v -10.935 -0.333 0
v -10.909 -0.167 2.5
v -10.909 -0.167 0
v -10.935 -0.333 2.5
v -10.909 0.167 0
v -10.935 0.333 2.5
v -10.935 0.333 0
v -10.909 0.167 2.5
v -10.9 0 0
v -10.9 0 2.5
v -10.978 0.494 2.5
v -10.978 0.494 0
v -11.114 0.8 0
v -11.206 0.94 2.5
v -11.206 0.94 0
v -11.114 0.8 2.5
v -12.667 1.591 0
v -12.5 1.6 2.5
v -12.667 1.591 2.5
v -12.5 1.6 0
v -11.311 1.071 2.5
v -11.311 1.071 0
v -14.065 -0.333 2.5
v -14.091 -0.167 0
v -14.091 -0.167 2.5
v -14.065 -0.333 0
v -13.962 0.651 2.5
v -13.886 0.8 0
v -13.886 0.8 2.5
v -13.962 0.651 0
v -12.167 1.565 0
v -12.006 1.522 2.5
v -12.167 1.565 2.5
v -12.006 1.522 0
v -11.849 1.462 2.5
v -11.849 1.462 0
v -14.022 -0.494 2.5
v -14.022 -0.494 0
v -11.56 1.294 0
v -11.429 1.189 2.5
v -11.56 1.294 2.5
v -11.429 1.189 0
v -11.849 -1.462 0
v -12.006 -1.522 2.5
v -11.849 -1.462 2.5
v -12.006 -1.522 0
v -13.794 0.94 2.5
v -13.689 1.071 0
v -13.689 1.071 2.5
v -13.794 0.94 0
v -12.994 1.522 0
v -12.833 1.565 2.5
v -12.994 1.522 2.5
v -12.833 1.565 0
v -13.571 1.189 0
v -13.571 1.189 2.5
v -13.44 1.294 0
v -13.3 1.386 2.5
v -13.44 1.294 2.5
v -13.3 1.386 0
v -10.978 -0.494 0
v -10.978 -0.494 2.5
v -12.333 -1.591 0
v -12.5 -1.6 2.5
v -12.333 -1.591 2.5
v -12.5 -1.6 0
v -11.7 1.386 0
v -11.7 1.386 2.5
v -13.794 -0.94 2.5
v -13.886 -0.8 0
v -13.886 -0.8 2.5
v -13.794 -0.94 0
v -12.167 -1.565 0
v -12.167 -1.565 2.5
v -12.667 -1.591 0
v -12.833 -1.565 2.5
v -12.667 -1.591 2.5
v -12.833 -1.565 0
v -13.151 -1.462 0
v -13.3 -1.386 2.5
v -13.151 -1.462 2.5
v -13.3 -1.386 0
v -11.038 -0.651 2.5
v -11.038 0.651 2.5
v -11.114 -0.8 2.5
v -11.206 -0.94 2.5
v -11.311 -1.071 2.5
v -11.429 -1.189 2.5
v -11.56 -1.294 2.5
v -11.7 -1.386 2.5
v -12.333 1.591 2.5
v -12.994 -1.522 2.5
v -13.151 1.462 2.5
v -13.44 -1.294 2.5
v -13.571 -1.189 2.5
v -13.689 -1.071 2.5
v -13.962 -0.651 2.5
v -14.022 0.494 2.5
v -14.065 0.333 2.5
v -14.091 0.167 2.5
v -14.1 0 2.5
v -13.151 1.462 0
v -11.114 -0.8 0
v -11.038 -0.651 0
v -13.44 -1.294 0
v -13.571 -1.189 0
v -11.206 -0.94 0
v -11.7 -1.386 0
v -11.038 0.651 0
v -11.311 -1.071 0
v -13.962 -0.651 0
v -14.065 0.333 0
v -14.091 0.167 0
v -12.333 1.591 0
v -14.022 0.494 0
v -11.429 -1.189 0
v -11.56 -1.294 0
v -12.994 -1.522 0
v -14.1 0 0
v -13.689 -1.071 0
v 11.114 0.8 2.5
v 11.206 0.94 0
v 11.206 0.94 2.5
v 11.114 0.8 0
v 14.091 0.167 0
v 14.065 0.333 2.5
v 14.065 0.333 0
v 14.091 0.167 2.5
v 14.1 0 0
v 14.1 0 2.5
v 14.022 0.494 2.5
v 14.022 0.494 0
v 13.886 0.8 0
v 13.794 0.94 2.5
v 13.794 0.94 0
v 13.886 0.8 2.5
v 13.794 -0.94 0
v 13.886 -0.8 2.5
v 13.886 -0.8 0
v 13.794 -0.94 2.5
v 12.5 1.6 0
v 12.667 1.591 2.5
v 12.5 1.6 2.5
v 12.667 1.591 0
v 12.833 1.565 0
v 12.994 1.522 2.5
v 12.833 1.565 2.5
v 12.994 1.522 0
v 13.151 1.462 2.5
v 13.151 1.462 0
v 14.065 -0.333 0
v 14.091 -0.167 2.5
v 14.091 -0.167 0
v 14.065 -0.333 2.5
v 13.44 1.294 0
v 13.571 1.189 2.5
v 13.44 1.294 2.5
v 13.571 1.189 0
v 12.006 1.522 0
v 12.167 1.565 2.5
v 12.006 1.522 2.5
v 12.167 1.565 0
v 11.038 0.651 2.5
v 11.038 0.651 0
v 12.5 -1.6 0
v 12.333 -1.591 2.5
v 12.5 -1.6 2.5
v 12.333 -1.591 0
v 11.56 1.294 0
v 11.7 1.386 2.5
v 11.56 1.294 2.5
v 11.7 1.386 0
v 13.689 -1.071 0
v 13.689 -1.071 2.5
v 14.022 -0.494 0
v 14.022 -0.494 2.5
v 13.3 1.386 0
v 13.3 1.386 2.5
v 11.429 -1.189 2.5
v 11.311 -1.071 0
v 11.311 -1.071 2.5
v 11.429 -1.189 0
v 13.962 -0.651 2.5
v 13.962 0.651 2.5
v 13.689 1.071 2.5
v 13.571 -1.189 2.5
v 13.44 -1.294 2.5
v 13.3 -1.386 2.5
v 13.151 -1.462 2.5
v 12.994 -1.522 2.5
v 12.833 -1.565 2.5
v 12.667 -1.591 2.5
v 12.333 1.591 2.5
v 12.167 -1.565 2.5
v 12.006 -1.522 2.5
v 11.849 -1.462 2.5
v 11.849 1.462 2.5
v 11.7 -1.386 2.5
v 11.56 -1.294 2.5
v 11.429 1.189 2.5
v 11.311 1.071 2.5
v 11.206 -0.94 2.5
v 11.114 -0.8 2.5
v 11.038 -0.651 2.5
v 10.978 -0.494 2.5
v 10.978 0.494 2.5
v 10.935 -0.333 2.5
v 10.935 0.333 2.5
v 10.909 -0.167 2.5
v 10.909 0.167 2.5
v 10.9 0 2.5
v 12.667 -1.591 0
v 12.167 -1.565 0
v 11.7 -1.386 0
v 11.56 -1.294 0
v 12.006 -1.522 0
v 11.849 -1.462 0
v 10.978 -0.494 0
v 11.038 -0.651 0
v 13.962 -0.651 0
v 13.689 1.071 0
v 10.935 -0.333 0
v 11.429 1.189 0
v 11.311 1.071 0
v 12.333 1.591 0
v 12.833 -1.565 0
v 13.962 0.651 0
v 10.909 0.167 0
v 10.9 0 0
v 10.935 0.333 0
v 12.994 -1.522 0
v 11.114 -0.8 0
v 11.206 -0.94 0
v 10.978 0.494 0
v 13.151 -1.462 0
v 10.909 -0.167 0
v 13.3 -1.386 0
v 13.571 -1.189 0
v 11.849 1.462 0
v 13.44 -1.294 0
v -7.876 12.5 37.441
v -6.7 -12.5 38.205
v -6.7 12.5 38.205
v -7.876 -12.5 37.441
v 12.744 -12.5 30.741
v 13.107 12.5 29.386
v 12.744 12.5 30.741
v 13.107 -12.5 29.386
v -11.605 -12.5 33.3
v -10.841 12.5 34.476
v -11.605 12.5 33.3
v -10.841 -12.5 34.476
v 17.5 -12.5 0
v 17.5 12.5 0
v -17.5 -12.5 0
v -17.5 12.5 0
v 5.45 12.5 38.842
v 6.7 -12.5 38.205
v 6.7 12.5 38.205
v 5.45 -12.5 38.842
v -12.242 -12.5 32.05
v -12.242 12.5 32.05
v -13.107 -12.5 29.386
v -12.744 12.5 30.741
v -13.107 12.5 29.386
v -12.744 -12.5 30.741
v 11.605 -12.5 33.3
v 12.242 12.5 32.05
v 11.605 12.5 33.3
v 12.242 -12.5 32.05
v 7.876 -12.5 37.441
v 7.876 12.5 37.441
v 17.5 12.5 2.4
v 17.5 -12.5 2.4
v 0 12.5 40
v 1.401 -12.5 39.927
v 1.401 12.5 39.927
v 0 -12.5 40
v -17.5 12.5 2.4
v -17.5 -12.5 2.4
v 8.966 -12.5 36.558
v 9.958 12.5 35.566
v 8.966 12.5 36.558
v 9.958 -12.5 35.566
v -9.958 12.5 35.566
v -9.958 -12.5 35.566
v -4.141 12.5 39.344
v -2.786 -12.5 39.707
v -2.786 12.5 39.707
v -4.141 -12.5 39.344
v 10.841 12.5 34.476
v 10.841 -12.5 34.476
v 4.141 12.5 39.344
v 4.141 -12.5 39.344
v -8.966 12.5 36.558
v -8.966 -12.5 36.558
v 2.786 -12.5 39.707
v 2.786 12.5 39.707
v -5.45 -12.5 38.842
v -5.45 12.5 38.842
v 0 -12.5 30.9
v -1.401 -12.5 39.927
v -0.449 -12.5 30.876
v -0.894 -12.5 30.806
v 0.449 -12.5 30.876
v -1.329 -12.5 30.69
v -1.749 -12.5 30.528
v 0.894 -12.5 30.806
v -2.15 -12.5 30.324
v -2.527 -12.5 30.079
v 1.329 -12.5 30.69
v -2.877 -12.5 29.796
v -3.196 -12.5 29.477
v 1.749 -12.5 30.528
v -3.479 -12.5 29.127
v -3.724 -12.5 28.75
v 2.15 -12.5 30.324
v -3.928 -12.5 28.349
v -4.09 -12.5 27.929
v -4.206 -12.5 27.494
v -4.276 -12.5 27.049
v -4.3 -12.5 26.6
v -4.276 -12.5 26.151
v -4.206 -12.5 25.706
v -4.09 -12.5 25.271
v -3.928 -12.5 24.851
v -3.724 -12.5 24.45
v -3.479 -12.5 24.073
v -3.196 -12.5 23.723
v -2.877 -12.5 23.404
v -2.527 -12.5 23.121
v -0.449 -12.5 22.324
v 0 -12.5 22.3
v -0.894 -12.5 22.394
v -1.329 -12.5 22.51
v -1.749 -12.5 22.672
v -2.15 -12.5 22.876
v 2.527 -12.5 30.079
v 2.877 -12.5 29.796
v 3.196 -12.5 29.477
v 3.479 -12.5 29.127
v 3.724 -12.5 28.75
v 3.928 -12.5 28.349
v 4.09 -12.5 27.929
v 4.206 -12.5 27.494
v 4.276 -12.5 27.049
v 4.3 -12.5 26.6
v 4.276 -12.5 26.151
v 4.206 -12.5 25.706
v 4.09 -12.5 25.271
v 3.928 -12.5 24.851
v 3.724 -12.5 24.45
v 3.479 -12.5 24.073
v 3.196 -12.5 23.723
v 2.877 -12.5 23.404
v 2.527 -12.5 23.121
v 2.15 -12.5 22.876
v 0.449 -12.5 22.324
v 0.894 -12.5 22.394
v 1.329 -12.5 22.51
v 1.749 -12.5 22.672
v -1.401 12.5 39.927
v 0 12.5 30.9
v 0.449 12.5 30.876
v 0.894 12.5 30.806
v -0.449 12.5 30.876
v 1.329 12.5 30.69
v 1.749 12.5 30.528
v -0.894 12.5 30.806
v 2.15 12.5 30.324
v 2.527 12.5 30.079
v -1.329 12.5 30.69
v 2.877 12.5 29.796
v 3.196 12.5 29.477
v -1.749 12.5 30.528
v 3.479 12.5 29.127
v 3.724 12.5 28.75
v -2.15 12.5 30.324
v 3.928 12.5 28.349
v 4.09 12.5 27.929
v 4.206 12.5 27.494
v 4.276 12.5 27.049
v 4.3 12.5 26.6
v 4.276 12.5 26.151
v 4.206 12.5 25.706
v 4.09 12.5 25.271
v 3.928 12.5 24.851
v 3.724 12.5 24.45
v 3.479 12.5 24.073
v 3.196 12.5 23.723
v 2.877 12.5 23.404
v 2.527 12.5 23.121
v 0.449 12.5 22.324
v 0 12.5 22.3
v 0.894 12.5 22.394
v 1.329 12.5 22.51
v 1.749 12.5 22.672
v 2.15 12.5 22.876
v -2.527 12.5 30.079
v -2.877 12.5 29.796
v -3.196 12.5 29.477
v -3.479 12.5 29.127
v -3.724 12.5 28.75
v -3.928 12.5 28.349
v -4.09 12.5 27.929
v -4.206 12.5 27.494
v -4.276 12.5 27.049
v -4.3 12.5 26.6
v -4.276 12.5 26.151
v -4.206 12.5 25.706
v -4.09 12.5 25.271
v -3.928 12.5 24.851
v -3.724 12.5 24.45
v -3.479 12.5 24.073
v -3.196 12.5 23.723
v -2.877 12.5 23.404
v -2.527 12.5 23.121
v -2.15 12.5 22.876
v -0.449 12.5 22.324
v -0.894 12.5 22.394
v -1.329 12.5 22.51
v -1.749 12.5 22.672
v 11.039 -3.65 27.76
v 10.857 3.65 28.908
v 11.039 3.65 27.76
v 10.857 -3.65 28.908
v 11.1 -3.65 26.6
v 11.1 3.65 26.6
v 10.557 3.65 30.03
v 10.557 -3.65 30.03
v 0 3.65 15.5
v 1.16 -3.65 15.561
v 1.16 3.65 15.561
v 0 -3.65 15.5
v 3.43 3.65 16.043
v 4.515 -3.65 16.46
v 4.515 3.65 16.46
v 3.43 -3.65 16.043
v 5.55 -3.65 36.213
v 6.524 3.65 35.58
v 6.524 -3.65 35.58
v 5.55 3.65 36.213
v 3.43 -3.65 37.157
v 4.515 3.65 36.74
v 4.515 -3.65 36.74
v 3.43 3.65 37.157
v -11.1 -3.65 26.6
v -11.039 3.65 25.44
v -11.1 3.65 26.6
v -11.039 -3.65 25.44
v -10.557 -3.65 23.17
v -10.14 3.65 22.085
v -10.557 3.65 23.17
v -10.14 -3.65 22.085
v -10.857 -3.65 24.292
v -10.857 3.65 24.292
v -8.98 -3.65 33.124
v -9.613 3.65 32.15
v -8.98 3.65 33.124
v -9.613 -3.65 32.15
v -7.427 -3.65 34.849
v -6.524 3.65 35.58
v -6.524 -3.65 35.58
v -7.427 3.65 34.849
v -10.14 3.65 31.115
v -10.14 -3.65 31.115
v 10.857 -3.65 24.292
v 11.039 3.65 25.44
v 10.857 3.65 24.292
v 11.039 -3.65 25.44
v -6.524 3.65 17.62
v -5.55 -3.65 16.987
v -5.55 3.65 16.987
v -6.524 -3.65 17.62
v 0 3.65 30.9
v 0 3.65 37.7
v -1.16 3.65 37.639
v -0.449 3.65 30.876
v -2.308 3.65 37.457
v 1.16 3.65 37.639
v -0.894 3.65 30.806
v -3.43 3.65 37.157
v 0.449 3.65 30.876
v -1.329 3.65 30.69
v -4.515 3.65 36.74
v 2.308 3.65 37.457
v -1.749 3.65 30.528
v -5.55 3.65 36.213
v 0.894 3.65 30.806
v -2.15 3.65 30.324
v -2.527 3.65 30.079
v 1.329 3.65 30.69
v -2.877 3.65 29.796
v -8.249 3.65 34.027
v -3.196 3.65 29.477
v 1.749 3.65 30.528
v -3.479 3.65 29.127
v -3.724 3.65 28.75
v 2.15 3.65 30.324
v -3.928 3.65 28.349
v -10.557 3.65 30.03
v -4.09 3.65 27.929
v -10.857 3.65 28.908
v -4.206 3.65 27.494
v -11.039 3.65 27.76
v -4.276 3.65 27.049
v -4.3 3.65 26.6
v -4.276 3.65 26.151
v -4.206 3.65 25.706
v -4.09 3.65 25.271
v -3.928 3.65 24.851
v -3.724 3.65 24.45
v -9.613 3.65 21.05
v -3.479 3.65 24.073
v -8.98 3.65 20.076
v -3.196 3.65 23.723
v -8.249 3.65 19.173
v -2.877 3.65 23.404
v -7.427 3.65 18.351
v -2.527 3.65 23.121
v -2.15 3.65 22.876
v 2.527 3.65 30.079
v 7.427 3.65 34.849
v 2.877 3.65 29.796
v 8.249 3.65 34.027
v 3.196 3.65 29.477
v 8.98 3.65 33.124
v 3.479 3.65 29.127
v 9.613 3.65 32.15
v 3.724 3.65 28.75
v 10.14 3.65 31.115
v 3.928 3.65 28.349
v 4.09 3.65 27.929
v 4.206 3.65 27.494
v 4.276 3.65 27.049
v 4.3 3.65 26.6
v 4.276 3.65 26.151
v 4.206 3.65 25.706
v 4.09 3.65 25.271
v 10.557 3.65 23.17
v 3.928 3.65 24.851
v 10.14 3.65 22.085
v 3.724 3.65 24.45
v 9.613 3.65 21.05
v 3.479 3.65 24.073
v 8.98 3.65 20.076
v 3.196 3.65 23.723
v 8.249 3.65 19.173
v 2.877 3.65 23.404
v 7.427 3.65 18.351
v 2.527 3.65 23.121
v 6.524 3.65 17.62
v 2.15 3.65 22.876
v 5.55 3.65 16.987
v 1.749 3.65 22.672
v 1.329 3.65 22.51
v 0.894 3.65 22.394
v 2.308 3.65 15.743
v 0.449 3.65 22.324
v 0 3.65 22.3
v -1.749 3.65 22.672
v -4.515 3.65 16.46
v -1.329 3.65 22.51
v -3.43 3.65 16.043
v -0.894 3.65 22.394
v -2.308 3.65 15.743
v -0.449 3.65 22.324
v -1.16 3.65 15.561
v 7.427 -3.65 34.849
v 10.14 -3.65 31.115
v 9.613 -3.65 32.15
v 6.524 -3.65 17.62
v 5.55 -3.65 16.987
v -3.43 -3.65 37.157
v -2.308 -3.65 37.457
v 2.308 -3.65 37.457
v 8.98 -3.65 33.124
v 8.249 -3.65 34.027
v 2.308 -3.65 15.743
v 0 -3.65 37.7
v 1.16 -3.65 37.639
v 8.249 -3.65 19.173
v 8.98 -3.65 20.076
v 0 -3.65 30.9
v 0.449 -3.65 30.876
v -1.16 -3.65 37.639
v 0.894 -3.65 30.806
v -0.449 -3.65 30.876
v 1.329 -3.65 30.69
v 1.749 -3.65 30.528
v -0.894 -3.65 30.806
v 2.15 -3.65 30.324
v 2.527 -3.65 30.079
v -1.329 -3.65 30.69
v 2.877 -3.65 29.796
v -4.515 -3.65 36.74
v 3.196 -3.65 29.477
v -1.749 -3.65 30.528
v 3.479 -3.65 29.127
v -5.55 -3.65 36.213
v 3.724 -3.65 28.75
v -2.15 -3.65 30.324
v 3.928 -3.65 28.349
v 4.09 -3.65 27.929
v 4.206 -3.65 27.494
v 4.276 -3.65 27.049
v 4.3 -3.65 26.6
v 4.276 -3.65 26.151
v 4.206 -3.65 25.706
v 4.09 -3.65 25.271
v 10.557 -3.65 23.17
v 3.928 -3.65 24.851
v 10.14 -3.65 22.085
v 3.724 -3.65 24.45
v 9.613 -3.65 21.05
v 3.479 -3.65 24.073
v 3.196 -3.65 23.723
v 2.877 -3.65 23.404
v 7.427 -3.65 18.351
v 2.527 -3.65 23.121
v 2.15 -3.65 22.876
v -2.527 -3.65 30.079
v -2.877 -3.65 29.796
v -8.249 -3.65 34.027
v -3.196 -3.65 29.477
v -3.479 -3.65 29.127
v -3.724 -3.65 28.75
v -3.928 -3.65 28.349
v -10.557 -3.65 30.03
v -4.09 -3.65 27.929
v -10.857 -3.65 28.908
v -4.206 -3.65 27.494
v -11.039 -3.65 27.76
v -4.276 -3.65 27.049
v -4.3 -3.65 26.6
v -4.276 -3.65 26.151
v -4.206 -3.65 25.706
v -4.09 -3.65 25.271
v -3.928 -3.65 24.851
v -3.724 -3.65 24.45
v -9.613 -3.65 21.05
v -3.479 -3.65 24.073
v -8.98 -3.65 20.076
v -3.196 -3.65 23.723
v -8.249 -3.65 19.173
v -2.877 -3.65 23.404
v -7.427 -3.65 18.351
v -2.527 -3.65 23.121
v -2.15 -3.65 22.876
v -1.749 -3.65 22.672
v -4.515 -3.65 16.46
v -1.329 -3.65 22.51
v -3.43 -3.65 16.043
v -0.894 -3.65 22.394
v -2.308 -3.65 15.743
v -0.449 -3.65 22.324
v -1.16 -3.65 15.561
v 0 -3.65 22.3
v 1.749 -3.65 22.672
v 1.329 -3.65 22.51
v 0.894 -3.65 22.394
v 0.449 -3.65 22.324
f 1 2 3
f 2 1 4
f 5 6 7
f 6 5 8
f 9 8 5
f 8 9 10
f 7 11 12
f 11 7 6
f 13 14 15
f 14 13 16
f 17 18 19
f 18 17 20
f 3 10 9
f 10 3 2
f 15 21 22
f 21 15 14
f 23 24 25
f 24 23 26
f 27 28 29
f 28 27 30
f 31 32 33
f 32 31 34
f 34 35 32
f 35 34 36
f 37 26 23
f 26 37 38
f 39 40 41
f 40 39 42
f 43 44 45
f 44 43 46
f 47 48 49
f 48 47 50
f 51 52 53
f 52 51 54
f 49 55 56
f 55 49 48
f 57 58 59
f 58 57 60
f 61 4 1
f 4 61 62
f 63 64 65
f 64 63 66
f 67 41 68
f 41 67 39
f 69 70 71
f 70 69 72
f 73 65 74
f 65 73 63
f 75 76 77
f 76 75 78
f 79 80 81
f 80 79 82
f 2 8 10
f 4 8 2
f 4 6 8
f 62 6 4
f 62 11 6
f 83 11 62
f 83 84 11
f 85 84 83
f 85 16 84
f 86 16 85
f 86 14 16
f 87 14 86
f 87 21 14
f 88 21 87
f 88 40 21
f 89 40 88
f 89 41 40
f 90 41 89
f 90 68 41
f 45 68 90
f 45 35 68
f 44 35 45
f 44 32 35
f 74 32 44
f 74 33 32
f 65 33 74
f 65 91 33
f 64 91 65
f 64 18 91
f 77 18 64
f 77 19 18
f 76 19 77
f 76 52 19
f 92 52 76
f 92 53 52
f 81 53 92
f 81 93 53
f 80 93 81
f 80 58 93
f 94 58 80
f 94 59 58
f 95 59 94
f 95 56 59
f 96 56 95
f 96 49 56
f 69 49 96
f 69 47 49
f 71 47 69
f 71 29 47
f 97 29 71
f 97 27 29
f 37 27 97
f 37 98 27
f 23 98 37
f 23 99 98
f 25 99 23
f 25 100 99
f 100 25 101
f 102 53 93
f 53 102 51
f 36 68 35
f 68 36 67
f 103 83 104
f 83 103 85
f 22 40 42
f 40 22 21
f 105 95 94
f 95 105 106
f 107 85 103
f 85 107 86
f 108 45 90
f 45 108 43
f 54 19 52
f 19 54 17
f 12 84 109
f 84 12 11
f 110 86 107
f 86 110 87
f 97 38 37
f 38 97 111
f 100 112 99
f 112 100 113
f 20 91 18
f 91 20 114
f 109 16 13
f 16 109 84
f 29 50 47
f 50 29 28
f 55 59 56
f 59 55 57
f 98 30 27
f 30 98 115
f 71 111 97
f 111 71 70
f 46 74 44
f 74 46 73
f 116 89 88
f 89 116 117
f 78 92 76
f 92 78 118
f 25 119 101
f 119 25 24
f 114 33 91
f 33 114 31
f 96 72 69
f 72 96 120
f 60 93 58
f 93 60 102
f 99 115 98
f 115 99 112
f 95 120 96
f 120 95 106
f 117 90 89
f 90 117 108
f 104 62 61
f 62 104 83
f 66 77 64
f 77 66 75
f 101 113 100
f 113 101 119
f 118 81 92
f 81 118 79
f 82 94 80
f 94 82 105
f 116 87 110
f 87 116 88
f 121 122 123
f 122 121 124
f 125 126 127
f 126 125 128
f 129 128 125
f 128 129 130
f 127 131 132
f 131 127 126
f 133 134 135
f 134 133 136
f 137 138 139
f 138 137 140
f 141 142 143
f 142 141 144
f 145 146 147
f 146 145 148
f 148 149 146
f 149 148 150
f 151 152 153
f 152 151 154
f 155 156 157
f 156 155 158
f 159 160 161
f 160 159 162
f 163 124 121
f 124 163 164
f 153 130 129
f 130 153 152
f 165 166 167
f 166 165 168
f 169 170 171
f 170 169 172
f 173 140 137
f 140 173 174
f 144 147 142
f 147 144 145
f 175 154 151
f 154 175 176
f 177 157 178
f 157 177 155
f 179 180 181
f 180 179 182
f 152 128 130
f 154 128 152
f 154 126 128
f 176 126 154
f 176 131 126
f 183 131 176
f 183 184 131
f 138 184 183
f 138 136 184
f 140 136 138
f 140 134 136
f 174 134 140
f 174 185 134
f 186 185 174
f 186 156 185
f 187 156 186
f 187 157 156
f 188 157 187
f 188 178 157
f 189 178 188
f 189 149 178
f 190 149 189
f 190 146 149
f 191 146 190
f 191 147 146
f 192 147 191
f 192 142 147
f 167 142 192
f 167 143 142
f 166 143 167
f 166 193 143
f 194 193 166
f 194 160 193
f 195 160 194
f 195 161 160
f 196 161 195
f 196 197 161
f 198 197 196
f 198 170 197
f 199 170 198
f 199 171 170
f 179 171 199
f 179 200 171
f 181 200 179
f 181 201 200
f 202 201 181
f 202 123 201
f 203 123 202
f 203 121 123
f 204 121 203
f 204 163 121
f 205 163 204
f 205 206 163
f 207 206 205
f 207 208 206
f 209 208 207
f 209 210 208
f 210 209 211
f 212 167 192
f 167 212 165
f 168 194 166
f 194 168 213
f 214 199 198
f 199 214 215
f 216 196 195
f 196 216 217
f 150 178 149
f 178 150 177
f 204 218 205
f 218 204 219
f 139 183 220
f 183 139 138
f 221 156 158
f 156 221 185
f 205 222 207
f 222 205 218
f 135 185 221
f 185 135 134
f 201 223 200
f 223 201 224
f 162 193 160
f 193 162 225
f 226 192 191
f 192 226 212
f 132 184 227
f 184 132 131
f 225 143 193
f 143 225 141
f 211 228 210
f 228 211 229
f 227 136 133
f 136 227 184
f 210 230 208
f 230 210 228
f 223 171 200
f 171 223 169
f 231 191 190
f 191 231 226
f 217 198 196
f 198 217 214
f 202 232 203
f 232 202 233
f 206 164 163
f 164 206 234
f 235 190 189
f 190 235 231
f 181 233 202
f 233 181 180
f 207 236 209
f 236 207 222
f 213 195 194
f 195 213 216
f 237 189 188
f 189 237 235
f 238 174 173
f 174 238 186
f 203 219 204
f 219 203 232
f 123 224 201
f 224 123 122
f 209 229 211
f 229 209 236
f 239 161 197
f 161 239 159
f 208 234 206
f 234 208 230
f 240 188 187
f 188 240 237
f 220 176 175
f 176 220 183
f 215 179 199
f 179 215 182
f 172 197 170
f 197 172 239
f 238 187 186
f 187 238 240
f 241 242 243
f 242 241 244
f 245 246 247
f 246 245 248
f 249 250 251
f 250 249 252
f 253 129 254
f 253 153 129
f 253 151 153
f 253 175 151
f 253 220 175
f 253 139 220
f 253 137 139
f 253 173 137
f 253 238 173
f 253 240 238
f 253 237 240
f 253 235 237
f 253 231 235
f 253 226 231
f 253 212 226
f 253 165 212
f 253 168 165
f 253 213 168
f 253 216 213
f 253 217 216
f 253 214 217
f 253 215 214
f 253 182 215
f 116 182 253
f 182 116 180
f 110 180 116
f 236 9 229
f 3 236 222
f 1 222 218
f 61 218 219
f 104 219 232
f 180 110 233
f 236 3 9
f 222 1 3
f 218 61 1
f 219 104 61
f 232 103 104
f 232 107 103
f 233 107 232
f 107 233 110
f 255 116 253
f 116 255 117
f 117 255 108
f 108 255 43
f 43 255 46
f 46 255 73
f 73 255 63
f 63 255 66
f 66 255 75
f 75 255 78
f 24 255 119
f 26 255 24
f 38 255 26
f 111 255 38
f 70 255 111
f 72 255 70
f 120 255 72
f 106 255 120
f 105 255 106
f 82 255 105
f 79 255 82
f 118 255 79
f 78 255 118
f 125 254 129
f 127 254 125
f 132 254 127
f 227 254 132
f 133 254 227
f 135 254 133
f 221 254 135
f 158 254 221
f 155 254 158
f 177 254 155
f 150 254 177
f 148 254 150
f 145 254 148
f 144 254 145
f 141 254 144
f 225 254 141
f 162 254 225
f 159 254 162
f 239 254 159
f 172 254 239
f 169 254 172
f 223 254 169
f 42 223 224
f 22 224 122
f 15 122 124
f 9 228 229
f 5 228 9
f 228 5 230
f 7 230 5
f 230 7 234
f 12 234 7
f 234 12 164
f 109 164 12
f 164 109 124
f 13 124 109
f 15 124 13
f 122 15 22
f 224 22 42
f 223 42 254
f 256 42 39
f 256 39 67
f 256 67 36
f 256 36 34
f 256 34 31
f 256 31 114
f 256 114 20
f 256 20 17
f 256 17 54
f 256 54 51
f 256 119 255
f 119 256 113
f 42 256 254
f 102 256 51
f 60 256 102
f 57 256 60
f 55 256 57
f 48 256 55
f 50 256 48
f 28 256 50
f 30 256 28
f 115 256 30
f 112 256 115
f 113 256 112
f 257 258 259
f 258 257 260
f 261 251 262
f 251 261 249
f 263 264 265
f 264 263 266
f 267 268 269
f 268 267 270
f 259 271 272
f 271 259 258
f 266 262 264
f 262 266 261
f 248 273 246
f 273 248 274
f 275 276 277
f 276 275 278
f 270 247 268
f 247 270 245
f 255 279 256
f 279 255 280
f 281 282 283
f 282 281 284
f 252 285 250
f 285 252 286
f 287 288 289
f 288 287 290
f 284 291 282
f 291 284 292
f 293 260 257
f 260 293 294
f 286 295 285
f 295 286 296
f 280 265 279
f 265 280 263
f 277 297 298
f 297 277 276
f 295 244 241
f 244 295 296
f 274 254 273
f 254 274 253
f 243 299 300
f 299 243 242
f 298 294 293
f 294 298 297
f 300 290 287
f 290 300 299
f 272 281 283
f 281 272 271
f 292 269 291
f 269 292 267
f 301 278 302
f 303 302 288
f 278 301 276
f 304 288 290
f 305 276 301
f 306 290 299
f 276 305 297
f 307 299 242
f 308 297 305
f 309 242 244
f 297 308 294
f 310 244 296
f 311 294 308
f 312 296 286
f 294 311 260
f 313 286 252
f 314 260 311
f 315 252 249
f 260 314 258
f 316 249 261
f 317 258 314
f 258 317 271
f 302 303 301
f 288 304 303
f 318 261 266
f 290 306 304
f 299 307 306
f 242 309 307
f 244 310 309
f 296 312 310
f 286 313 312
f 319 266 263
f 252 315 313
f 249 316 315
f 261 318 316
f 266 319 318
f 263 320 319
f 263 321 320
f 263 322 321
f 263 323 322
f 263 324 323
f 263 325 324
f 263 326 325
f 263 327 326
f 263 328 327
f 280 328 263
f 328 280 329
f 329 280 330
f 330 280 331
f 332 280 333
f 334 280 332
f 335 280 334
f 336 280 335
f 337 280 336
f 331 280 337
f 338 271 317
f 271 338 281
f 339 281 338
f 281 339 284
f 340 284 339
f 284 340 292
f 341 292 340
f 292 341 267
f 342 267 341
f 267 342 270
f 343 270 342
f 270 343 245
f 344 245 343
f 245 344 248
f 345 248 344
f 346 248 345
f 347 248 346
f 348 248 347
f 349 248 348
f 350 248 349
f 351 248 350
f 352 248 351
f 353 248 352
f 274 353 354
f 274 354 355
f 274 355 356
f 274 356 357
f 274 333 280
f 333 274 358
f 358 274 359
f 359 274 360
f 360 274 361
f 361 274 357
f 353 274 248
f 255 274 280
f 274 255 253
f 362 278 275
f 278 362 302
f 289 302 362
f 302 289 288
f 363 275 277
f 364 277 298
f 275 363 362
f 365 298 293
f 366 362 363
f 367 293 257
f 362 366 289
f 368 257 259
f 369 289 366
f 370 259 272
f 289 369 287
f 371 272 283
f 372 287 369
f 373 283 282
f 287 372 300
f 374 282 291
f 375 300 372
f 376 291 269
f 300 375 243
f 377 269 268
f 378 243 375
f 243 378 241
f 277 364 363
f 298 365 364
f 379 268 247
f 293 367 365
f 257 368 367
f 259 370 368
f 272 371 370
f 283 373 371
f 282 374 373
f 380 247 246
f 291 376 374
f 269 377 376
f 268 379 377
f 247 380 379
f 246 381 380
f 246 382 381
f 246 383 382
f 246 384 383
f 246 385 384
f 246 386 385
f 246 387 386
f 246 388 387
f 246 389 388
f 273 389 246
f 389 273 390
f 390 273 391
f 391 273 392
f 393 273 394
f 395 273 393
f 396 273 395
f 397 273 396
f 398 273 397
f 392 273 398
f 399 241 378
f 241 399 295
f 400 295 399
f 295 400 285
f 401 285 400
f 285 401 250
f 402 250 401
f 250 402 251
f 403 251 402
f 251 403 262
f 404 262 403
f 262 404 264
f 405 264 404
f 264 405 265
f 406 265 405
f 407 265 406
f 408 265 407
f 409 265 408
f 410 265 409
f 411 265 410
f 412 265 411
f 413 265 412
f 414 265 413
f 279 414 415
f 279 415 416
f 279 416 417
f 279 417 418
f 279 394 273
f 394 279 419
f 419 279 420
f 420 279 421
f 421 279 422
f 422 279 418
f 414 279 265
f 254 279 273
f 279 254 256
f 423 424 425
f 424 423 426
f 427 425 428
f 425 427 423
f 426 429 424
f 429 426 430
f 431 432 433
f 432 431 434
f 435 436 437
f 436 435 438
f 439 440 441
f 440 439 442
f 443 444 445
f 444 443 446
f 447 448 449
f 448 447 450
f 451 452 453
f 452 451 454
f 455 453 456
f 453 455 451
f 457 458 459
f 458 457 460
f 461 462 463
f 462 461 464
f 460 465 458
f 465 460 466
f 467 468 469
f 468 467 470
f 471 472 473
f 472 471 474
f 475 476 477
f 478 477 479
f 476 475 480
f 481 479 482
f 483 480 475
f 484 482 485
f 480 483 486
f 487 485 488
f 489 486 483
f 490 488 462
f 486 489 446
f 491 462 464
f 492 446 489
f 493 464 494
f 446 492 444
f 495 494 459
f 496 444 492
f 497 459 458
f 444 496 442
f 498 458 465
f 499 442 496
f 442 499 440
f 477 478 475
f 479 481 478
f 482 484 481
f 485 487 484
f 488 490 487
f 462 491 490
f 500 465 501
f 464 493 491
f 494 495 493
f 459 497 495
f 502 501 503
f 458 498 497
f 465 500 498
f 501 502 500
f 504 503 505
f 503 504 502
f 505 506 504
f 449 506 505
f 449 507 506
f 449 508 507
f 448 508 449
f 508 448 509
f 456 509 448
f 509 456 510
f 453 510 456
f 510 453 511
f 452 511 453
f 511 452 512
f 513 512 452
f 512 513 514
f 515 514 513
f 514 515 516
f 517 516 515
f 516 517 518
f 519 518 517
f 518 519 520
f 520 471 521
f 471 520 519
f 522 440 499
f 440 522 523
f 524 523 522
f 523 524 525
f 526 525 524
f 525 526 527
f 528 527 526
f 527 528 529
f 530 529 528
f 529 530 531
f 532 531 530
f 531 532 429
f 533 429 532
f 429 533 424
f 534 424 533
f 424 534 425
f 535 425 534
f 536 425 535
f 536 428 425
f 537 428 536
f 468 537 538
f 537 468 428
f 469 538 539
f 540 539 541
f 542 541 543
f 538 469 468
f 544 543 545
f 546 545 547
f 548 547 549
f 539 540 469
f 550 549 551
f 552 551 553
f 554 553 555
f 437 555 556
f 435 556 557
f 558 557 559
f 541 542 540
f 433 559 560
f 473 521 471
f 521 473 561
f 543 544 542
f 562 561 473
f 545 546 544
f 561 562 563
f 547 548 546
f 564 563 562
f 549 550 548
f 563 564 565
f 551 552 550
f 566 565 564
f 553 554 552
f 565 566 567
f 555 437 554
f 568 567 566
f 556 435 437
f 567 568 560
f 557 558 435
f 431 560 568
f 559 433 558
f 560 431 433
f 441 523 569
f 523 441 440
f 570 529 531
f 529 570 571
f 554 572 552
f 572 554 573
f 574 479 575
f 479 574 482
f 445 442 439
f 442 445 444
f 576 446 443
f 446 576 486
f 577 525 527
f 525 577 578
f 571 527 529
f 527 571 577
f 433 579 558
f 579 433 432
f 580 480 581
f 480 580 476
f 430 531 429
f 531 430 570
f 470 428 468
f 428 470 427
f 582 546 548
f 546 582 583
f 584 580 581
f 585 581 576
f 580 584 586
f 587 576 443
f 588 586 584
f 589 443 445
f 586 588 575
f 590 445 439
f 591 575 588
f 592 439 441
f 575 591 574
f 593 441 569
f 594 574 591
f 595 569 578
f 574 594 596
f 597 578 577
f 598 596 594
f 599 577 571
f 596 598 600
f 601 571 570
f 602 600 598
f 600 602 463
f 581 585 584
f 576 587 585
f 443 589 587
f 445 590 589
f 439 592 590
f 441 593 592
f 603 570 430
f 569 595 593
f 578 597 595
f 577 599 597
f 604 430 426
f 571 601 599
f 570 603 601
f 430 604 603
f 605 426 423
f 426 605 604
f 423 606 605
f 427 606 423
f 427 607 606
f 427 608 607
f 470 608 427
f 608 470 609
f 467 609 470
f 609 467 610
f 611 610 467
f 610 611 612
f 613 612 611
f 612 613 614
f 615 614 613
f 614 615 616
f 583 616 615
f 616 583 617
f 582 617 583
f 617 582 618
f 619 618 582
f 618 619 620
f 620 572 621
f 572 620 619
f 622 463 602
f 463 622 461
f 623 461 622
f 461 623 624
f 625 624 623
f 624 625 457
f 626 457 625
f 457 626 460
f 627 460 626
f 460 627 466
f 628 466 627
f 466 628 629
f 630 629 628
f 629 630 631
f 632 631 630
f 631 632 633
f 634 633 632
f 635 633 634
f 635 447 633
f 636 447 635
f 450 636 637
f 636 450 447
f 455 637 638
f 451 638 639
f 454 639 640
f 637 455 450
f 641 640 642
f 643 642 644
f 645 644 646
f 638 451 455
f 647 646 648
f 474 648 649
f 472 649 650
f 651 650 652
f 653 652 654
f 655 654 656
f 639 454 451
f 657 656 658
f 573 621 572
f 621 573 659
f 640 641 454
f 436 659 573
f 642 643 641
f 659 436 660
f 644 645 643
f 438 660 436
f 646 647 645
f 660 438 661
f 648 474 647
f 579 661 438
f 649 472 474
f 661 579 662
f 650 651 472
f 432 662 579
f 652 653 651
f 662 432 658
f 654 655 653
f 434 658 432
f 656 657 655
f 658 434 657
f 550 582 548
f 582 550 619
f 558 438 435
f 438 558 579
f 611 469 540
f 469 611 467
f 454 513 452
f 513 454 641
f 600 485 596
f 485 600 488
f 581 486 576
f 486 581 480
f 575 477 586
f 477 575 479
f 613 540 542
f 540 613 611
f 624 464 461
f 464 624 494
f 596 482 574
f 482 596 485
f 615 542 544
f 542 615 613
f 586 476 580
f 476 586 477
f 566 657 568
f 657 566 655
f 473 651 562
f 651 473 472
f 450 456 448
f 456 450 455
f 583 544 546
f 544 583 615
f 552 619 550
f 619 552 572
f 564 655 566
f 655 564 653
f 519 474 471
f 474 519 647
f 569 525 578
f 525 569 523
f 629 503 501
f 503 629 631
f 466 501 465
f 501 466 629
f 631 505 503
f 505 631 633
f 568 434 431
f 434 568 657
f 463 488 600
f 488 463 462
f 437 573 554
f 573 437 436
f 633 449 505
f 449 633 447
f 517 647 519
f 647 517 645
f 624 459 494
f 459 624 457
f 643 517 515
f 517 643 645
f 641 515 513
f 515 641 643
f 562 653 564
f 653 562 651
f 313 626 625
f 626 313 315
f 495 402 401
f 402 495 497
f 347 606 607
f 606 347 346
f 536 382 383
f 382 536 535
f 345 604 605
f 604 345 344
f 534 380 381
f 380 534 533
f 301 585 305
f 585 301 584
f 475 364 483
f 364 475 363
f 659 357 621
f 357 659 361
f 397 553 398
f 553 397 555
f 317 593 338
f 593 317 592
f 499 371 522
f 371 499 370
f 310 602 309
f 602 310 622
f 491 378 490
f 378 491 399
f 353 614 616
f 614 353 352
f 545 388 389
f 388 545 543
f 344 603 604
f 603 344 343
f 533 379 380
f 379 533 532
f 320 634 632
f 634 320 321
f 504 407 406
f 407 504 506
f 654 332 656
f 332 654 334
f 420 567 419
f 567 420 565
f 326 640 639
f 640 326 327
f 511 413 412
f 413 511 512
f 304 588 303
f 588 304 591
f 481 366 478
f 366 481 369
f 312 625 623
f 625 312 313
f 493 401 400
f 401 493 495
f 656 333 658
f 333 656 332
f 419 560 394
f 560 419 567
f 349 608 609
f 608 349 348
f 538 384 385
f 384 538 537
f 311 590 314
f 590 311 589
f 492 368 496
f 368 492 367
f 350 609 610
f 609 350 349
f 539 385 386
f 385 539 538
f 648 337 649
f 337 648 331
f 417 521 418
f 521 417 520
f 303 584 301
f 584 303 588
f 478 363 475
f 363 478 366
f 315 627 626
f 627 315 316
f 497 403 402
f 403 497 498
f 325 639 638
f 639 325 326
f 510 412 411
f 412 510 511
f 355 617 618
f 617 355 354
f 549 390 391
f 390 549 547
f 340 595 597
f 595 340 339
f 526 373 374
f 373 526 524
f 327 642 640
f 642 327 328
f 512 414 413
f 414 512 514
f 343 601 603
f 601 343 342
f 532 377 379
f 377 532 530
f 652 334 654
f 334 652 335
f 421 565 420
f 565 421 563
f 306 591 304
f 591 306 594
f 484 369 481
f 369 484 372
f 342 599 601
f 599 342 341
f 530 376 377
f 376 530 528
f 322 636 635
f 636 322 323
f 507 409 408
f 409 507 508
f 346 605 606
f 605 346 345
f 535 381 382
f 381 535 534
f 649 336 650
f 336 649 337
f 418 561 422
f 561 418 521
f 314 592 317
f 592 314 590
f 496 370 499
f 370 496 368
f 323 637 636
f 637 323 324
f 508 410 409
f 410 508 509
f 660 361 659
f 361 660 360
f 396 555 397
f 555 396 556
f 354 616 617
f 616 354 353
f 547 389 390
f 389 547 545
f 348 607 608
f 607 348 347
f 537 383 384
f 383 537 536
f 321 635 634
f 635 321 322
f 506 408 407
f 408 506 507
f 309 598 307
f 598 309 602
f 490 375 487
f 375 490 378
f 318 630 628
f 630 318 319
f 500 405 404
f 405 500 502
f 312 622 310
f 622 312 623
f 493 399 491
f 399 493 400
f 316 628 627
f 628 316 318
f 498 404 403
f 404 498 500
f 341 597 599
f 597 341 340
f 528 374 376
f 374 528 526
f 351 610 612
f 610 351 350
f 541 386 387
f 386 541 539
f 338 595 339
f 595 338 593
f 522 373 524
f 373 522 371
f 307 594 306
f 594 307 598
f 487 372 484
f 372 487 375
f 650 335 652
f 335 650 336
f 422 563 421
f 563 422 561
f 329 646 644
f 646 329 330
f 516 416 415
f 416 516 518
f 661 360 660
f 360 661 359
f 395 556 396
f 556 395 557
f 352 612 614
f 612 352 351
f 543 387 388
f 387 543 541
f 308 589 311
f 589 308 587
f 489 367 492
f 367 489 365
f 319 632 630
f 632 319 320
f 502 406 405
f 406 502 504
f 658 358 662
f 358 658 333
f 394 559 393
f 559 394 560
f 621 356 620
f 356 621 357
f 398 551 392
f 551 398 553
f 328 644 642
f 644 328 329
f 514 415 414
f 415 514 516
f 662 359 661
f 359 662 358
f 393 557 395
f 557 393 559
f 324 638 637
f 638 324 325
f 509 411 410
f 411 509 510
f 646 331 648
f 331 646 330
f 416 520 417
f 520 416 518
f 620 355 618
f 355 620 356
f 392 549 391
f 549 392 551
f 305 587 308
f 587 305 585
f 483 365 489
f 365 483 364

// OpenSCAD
// file: parameters.scad
// =============================================================================
// Coil Winder - Common Parameters
// DTU 34621 Metal Detector Project
// =============================================================================

// -----------------------------------------------------------------------------
// Hardware Dimensions
// -----------------------------------------------------------------------------

// M8 Threaded Rod (Spindle)
spindle_dia = 8;
spindle_length = 300;

// 608ZZ Bearing (Skateboard bearing)
bearing_od = 22;
bearing_id = 8;
bearing_width = 7;

// M3 Hardware
m3_bolt_dia = 3.2;
m3_nut_dia = 6.4;
m3_nut_height = 2.4;
m3_head_dia = 5.5;
m3_head_height = 3;

// M8 Hardware
m8_nut_dia = 14.6;
m8_nut_height = 6.5;

// -----------------------------------------------------------------------------
// Servo Dimensions (SG90 / MG90S style)
// -----------------------------------------------------------------------------

servo_body_w = 23;
servo_body_h = 22.5;
servo_body_d = 12.5;
servo_tab_w = 32.5;
servo_tab_h = 2.5;
servo_tab_offset = 15.5;  // from bottom
servo_mount_hole_spacing = 28;
servo_shaft_offset = 5.5;  // from center of body
servo_horn_length = 15;

// -----------------------------------------------------------------------------
// ITR8307 Optical Sensor
// -----------------------------------------------------------------------------

itr8307_width = 10.8;
itr8307_depth = 5.2;
itr8307_height = 6.3;
itr8307_slot_width = 3;
itr8307_slot_depth = 4;

// -----------------------------------------------------------------------------
// Coil Dimensions
// -----------------------------------------------------------------------------

// TX Coil - 200mm diameter
tx_coil_dia = 200;
tx_coil_width = 18;
tx_coil_turns = 68;

// RX Coil - 80mm diameter
rx_coil_dia = 80;
rx_coil_width = 14;
rx_coil_turns = 170;

// Bucking Coil - 120mm diameter
buck_coil_dia = 120;
buck_coil_width = 18;
buck_coil_turns = 35;

// -----------------------------------------------------------------------------
// Frame Dimensions
// -----------------------------------------------------------------------------

base_length = 250;
base_width = 120;
base_thickness = 5;

bearing_mount_height = 40;
bearing_mount_width = 35;
bearing_mount_depth = 25;

// Distance between bearing centers
spindle_span = 200;

// -----------------------------------------------------------------------------
// Wire Guide / Traverse
// -----------------------------------------------------------------------------

guide_rail_length = 80;
guide_rail_width = 10;
guide_rail_height = 5;

carriage_width = 25;
carriage_depth = 20;
carriage_height = 15;

// -----------------------------------------------------------------------------
// Encoder Wheel
// -----------------------------------------------------------------------------

encoder_wheel_dia = 40;
encoder_wheel_thickness = 5;
encoder_slot_width = 5;
encoder_slot_depth = 12;

// -----------------------------------------------------------------------------
// General Tolerances
// -----------------------------------------------------------------------------

clearance = 0.3;        // General clearance for fitting parts
press_fit = 0.1;        // Tight fit
slide_fit = 0.4;        // Sliding fit

// -----------------------------------------------------------------------------
// Print Settings
// -----------------------------------------------------------------------------

wall_thickness = 2.4;   // 3 perimeters at 0.4mm nozzle
layer_height = 0.2;

$fn = 60;  // Circle resolution
// main file
// =============================================================================
// Bearing Mount - Holds 608ZZ bearing for spindle
// =============================================================================

include <parameters.scad>

module bearing_mount() {
    difference() {
        union() {
            // Main body
            hull() {
                // Base
                translate([0, 0, wall_thickness/2])
                    cube([bearing_mount_width, bearing_mount_depth, wall_thickness], center=true);

                // Top with bearing pocket
                translate([0, 0, bearing_mount_height - bearing_od/2 - wall_thickness])
                    rotate([90, 0, 0])
                        cylinder(d=bearing_od + wall_thickness*2, h=bearing_mount_depth, center=true);
            }
        }

        // Bearing pocket (press fit)
        translate([0, 0, bearing_mount_height - bearing_od/2 - wall_thickness])
            rotate([90, 0, 0])
                cylinder(d=bearing_od + press_fit*2, h=bearing_width + clearance, center=true);

        // Spindle through-hole
        translate([0, 0, bearing_mount_height - bearing_od/2 - wall_thickness])
            rotate([90, 0, 0])
                cylinder(d=spindle_dia + clearance*2, h=bearing_mount_depth + 1, center=true);

        // Mounting holes (M3)
        for (x = [-bearing_mount_width/2 + 5, bearing_mount_width/2 - 5]) {
            translate([x, 0, -0.1])
                cylinder(d=m3_bolt_dia, h=wall_thickness + 0.2);
        }
    }
}

// Render for export
bearing_mount();
